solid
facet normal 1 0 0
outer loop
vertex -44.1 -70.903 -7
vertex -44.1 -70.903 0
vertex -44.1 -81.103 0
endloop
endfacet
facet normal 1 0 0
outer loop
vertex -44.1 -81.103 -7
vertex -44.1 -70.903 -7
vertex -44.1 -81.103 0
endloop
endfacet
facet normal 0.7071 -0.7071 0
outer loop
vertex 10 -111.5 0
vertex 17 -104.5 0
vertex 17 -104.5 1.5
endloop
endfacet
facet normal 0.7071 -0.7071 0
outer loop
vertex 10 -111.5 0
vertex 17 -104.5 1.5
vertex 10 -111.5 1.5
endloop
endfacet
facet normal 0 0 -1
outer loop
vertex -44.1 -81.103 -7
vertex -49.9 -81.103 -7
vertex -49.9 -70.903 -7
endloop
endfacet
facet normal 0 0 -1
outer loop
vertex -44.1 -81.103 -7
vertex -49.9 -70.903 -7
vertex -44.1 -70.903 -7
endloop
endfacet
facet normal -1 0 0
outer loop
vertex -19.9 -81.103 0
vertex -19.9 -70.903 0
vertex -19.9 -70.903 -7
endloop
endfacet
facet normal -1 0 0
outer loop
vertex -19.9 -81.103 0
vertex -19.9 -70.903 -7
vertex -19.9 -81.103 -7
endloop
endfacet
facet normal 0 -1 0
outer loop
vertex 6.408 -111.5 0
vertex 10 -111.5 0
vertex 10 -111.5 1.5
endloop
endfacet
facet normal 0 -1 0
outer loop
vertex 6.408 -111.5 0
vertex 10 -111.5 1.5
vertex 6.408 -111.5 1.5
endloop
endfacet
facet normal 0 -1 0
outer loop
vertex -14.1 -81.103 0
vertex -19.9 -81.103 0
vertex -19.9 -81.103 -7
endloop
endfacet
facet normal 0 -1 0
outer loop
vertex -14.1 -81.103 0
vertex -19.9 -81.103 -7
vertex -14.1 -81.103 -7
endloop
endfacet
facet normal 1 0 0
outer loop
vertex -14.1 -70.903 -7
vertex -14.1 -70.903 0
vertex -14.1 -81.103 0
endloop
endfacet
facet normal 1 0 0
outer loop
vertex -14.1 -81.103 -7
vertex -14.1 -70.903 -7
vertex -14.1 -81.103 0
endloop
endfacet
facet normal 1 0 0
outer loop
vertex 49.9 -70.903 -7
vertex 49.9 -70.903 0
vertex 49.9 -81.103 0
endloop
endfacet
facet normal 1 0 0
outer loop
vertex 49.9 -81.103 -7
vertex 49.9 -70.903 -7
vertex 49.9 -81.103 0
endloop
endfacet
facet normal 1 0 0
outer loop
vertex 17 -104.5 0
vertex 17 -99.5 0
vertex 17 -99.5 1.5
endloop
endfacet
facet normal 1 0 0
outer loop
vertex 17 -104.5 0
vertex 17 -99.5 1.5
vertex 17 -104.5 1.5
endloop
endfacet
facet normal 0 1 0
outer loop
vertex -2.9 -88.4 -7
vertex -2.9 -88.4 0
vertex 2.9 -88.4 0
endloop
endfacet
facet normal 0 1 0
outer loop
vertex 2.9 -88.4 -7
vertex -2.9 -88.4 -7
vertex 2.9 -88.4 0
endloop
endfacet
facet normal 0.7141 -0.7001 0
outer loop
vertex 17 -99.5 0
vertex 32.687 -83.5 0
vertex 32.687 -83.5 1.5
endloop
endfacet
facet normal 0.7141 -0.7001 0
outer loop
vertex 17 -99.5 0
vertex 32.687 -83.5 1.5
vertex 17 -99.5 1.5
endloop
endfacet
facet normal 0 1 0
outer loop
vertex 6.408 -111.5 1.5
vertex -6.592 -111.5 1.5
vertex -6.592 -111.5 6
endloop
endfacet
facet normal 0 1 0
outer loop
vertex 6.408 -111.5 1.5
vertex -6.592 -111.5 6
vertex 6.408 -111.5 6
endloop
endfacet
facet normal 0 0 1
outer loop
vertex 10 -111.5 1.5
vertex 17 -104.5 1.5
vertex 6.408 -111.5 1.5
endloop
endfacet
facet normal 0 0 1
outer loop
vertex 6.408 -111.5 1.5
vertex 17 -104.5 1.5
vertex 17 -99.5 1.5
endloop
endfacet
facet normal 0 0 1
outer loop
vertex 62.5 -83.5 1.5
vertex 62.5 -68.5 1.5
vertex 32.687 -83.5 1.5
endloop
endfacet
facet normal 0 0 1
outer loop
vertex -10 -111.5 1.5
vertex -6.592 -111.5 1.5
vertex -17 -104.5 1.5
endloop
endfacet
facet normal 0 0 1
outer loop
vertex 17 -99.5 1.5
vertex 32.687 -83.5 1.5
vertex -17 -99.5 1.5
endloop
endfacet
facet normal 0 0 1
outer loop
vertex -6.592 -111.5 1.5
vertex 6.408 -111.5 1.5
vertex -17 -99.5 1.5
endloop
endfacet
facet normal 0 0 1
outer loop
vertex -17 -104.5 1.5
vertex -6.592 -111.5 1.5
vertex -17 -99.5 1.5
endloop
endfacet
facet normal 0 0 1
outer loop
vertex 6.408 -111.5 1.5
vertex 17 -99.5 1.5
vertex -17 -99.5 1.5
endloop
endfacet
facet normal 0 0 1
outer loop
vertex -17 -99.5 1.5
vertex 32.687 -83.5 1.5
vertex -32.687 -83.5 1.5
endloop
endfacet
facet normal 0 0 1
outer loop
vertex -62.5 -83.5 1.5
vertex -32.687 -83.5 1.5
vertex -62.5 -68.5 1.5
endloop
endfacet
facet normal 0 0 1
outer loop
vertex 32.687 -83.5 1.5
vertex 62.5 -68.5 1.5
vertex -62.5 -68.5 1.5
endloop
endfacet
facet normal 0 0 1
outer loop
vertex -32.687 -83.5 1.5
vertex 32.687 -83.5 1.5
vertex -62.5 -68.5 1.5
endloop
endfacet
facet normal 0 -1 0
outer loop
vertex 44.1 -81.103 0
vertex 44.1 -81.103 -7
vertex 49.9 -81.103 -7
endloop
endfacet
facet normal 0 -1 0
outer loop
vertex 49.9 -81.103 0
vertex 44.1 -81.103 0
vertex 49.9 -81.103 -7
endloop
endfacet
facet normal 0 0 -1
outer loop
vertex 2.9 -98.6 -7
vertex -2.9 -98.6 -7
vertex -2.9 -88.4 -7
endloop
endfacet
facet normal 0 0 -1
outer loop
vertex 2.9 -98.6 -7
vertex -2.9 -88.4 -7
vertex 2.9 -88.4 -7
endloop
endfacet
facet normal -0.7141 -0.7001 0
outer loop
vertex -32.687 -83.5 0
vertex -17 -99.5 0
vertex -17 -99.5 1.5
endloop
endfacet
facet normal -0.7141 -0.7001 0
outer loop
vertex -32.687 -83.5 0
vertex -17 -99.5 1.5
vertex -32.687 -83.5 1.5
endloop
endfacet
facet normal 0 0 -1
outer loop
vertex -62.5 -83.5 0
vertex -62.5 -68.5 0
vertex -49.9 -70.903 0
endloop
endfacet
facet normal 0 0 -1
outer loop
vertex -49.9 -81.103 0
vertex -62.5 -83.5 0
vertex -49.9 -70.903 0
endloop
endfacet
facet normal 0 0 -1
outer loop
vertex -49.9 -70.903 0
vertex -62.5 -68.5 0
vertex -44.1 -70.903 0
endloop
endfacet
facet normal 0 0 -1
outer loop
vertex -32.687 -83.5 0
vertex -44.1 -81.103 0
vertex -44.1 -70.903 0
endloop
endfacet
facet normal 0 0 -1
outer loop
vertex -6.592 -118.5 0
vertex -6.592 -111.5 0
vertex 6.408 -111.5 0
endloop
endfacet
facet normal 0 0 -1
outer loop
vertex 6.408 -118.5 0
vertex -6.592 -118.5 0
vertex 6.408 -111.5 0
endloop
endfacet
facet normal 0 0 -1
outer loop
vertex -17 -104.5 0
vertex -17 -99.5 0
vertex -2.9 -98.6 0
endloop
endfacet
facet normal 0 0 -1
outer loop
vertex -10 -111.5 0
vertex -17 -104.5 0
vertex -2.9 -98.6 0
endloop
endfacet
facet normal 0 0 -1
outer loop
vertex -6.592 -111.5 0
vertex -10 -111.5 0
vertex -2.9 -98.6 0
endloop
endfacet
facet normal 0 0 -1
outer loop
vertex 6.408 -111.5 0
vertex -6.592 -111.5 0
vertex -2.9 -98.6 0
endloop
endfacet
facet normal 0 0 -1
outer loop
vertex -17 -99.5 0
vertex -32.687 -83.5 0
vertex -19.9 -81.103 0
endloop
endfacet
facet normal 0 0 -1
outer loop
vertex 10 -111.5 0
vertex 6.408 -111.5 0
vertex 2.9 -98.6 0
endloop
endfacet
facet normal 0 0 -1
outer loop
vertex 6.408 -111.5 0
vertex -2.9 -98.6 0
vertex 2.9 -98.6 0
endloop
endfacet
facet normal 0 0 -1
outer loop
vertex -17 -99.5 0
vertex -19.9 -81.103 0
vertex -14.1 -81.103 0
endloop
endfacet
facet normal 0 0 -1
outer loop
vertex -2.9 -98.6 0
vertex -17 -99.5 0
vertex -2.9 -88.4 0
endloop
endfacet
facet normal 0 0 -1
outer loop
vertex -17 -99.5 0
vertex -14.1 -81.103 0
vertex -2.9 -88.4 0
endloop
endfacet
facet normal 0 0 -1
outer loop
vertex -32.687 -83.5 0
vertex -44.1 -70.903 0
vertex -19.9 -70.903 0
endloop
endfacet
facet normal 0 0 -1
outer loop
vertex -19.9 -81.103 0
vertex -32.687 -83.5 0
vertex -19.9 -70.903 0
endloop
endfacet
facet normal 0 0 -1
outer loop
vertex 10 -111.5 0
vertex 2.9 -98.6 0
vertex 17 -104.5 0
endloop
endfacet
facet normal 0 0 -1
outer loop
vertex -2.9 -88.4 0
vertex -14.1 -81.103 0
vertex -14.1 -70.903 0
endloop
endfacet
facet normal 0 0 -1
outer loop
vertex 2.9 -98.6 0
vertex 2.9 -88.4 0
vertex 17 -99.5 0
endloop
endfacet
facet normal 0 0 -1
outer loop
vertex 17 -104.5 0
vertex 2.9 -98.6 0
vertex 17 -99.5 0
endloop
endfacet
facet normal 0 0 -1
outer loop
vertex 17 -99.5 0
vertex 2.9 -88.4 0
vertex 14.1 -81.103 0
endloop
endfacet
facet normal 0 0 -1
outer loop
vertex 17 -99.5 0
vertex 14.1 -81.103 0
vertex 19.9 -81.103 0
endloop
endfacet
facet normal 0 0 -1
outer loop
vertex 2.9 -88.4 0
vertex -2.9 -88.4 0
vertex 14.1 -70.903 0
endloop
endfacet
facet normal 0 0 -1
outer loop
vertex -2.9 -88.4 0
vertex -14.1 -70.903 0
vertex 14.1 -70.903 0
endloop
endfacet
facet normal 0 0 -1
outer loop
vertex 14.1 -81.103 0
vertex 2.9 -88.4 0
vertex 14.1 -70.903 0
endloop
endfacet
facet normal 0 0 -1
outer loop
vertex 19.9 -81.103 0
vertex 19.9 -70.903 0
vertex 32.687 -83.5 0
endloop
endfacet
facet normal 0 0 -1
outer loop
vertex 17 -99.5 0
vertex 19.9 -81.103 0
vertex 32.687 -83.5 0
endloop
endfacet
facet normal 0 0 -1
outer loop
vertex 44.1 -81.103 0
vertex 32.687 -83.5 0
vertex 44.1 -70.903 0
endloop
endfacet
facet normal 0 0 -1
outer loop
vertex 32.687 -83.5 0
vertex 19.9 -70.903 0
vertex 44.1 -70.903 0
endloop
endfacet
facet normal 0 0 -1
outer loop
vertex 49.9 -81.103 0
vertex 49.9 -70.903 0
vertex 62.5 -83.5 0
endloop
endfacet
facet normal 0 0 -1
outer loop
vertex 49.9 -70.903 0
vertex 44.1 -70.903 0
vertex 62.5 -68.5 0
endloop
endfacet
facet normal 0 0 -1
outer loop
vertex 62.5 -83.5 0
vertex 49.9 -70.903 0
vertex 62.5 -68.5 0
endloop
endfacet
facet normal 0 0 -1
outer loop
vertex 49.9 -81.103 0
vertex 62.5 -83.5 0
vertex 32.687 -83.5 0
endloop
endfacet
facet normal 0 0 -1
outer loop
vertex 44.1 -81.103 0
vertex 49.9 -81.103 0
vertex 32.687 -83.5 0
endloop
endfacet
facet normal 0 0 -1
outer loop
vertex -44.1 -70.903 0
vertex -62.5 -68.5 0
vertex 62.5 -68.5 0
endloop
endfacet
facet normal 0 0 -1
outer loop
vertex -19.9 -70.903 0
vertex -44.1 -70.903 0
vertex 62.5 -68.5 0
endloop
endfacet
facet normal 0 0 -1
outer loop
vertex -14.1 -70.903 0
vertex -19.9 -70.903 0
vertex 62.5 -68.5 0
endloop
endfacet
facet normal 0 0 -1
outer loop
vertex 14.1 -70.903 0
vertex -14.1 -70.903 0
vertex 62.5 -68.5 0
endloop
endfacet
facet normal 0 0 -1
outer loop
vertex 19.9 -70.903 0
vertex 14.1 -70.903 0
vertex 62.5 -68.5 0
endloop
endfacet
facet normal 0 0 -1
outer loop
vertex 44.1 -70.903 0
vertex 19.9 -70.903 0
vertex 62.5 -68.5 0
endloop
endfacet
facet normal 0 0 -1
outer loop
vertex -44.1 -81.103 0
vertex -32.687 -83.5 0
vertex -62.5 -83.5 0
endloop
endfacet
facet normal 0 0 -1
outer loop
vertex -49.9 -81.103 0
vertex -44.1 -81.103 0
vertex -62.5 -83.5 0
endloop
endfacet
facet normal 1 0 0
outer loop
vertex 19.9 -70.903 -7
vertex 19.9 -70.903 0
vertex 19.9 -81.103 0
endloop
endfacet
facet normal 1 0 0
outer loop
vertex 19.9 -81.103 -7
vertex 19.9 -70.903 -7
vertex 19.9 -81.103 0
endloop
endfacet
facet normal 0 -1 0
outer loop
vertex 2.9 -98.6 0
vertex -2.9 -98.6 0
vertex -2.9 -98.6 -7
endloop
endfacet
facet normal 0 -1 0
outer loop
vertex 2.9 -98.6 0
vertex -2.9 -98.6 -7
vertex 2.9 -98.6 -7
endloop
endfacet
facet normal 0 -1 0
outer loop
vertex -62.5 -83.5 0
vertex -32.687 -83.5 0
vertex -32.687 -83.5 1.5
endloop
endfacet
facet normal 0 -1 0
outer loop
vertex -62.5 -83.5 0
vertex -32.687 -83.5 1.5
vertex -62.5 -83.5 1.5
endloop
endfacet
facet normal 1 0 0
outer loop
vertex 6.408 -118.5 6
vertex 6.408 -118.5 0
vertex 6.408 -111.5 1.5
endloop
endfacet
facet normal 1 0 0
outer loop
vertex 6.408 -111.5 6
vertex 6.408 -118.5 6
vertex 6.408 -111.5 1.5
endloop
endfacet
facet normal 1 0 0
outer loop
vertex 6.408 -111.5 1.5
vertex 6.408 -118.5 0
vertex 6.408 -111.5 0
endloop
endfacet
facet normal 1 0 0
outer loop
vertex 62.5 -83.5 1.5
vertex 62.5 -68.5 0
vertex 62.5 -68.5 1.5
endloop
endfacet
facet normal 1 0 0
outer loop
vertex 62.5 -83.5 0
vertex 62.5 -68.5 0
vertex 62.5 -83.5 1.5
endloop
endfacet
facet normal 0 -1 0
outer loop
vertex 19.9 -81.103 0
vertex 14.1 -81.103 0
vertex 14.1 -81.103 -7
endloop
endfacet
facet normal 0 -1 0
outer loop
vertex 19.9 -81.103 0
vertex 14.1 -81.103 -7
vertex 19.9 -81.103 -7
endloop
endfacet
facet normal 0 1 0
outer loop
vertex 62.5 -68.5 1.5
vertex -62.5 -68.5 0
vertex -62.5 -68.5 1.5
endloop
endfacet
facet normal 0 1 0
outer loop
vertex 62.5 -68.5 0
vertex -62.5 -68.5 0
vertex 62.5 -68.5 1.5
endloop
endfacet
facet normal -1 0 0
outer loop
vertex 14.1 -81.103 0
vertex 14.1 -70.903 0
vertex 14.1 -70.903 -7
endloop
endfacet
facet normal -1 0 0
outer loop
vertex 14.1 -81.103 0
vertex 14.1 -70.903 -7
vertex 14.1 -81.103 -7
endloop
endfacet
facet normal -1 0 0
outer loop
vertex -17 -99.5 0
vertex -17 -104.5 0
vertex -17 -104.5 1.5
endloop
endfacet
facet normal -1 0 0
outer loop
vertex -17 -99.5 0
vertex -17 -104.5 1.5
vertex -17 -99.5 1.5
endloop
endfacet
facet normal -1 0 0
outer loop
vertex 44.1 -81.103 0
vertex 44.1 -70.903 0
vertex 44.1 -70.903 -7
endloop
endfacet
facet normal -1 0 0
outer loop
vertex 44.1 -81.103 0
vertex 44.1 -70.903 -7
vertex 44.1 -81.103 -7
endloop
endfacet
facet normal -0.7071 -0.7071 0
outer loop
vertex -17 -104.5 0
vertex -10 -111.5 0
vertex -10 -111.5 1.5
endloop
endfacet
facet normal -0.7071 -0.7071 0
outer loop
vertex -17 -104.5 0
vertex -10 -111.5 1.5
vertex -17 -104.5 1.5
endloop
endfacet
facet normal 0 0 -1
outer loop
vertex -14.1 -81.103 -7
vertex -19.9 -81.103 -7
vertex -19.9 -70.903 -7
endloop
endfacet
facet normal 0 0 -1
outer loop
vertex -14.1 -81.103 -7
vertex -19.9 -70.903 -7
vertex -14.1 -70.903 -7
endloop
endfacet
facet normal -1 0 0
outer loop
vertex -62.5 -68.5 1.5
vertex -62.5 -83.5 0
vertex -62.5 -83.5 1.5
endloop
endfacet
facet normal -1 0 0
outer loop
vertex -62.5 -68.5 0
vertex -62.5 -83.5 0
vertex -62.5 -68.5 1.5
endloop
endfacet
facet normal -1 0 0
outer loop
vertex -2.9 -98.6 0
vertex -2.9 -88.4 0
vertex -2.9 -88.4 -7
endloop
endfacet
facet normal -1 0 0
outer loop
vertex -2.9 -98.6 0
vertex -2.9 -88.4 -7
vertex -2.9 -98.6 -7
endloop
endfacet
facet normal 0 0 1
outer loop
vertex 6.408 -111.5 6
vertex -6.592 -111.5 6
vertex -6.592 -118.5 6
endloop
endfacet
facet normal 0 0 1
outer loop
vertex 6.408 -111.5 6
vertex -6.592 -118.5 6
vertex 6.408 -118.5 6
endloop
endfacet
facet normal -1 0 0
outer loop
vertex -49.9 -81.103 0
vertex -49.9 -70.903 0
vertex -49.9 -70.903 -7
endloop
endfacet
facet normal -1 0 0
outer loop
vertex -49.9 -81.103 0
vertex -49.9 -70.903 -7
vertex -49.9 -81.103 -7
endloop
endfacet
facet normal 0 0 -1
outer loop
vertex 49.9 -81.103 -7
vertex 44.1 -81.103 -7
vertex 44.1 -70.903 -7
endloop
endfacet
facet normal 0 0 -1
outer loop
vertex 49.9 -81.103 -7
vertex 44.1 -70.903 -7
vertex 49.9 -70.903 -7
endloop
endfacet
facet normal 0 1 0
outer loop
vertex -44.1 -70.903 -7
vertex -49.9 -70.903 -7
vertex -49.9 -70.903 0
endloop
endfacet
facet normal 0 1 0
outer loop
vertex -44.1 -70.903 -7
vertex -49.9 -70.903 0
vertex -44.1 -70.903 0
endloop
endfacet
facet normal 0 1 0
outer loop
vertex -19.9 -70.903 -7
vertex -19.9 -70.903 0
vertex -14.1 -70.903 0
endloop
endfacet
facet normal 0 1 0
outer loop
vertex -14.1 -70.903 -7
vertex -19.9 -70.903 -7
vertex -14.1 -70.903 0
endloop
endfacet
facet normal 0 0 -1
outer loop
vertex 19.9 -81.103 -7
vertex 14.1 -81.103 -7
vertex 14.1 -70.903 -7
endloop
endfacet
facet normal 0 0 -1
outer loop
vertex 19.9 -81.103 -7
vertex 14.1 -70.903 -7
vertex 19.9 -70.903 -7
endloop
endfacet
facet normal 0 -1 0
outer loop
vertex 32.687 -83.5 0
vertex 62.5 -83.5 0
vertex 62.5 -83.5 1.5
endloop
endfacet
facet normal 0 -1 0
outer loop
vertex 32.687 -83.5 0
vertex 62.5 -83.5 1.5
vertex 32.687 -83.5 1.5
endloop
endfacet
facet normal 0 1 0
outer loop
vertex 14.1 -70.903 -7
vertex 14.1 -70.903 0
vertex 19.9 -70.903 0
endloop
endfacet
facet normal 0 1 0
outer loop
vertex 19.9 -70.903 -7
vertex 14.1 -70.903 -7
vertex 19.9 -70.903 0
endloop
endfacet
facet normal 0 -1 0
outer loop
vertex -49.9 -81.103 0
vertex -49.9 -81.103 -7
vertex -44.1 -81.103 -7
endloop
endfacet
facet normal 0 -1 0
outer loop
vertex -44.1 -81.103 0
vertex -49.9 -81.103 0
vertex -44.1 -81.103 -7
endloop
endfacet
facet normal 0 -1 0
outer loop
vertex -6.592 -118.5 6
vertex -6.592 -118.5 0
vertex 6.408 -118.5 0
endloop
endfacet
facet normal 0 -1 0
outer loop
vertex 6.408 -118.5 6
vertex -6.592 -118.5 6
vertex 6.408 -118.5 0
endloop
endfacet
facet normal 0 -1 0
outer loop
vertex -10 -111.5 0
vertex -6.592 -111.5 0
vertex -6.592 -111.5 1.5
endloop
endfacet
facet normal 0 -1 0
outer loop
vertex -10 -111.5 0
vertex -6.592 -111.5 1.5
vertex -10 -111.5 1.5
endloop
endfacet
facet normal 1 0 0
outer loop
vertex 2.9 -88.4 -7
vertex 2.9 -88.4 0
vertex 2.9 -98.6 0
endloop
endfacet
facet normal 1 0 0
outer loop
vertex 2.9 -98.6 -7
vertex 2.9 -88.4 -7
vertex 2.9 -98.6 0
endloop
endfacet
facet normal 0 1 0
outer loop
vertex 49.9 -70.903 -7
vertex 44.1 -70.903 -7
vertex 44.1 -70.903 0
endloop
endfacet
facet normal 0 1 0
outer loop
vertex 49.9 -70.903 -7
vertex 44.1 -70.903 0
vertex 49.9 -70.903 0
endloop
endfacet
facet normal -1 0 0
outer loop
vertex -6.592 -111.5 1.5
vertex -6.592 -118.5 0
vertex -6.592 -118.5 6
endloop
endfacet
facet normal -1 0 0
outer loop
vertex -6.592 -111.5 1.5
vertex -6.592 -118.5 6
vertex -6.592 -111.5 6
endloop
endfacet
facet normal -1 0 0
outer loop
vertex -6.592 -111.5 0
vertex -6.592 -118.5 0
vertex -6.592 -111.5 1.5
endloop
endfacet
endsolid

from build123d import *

# Parameters (mm, degrees)
PAD005002_DEPTH = 1.5
SKETCH011_W     = 5.8
SKETCH011_H     = 10.2
PAD005003_DEPTH = 7
SKETCH012_W     = 13
SKETCH012_H     = 7
PAD005004_DEPTH = 6


with BuildPart() as part:
    # Sketch010 → Pad005002 (new body)
    with BuildSketch(Plane.XY):
        Polygon((-62.5, 25), (62.5, 25), (62.5, 10), (32.686661, 10), (17, -6), (17, -11), (10, -18), (-10, -18), (-17, -11), (-17, -6), (-32.686661, 10), (-62.5, 10), align=None)
    extrude(amount=PAD005002_DEPTH)

    # Sketch011 (on Face13 of Pad005002) → Pad005003 (join)
    with BuildSketch(Plane(origin=(0, 0, 0), x_dir=(1, 0, 0), z_dir=(0, 0, -1))):
        Rectangle(SKETCH011_W, SKETCH011_H)
        with Locations((-47, -17.497188)):
            Rectangle(SKETCH011_W, SKETCH011_H)
        with Locations((-17, -17.497188)):
            Rectangle(SKETCH011_W, SKETCH011_H)
        with Locations((17, -17.497188)):
            Rectangle(SKETCH011_W, SKETCH011_H)
        with Locations((47, -17.497188)):
            Rectangle(SKETCH011_W, SKETCH011_H)
    extrude(amount=PAD005003_DEPTH)

    # Sketch012 → Pad005004 (join)
    with BuildSketch(Plane.XY):
        with Locations((-0.091507, -21.5)):
            Rectangle(SKETCH012_W, SKETCH012_H)
    extrude(amount=PAD005004_DEPTH)


with BuildPart() as part_1:
    # Body003002 placement: moved
    add(part.part.moved(Location((0, -93.5, 0))))


solid = part_1.part
